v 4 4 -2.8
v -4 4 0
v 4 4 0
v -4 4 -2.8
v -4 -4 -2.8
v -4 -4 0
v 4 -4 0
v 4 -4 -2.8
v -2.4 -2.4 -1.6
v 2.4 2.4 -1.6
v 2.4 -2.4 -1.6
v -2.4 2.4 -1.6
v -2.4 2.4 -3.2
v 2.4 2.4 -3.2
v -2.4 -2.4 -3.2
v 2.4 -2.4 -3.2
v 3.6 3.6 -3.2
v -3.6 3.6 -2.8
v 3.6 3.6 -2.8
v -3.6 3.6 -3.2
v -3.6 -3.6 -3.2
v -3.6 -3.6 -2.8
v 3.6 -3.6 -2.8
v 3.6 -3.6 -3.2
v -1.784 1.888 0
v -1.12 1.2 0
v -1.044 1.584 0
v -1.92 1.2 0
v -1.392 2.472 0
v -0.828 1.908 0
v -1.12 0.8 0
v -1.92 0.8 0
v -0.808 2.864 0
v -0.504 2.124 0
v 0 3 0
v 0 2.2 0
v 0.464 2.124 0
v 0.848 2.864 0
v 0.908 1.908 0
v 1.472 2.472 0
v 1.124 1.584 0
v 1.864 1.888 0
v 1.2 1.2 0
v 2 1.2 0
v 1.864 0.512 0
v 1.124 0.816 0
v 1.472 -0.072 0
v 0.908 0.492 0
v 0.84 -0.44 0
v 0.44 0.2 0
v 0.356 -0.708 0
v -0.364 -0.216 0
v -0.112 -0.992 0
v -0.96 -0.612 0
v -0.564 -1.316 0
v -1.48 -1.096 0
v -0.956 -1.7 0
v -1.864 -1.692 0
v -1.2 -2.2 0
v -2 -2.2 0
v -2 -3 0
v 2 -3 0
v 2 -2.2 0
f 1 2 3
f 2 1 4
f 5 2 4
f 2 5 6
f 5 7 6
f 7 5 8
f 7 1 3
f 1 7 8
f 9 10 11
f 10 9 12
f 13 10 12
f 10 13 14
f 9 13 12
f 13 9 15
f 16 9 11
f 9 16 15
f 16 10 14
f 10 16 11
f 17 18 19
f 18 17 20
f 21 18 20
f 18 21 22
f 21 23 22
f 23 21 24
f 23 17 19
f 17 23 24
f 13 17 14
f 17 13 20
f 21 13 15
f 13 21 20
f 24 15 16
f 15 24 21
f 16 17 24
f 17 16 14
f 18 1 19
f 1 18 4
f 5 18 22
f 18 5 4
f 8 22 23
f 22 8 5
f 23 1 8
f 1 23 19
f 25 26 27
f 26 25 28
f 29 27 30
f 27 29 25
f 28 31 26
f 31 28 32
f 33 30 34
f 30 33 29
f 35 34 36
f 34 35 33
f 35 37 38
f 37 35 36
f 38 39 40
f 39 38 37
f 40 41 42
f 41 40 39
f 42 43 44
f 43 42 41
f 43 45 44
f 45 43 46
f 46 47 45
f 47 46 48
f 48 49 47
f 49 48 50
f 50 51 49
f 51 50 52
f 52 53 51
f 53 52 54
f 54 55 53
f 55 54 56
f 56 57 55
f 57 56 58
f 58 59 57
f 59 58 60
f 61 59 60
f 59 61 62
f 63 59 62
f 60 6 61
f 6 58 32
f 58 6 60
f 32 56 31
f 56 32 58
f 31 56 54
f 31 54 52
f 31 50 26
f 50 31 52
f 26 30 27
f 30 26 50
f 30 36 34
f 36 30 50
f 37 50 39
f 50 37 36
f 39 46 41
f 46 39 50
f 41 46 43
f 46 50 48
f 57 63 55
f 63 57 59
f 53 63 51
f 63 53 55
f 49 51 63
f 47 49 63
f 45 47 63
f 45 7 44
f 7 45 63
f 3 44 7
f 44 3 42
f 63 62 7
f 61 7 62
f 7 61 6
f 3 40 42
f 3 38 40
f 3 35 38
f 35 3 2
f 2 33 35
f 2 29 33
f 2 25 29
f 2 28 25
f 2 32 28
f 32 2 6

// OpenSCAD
// file: ../p/4-4edge.scad
use <../lib.scad>
$fa=1; $fs=0.2;
function ldraw_lib__4_4edge(realsolid=false) = [
// 0 Circle 1.0
// 0 Name: 4-4edge.dat
// 0 Author: James Jessiman
// 0 !LDRAW_ORG Primitive UPDATE 2017-01
// 0 !LICENSE Licensed under CC BY 2.0 and CC BY 4.0 : see CAreadme.txt
// 
// 0 BFC CERTIFY CCW
  [0,"BFC","CERTIFY"],
  [0,"BFC","CCW"],
// 
// 0 !HISTORY 1998-12-15 [PTadmin] Official Update 1998-10
// 0 !HISTORY 2005-12-28 [PTadmin] Official Update 2005-01
// 0 !HISTORY 2007-06-24 [PTadmin] Header formatted for Contributor Agreement
// 0 !HISTORY 2008-07-01 [PTadmin] Official Update 2008-01
// 0 !HISTORY 2017-01-15 [Steffen] BFCed
// 0 !HISTORY 2017-12-30 [PTadmin] Official Update 2017-01
// 
// 
// 2 24 1 0 0 0.9239 0 0.3827
  [2,24,1,0,0,0.9239,0,0.3827],
// 2 24 0.9239 0 0.3827 0.7071 0 0.7071
  [2,24,0.9239,0,0.3827,0.7071,0,0.7071],
// 2 24 0.7071 0 0.7071 0.3827 0 0.9239
  [2,24,0.7071,0,0.7071,0.3827,0,0.9239],
// 2 24 0.3827 0 0.9239 0 0 1
  [2,24,0.3827,0,0.9239,0,0,1],
// 2 24 0 0 1 -0.3827 0 0.9239
  [2,24,0,0,1,-0.3827,0,0.9239],
// 2 24 -0.3827 0 0.9239 -0.7071 0 0.7071
  [2,24,-0.3827,0,0.9239,-0.7071,0,0.7071],
// 2 24 -0.7071 0 0.7071 -0.9239 0 0.3827
  [2,24,-0.7071,0,0.7071,-0.9239,0,0.3827],
// 2 24 -0.9239 0 0.3827 -1 0 -0
  [2,24,-0.9239,0,0.3827,-1,0,-0],
// 2 24 -1 0 -0 -0.9239 0 -0.3827
  [2,24,-1,0,-0,-0.9239,0,-0.3827],
// 2 24 -0.9239 0 -0.3827 -0.7071 0 -0.7071
  [2,24,-0.9239,0,-0.3827,-0.7071,0,-0.7071],
// 2 24 -0.7071 0 -0.7071 -0.3827 0 -0.9239
  [2,24,-0.7071,0,-0.7071,-0.3827,0,-0.9239],
// 2 24 -0.3827 0 -0.9239 0 0 -1
  [2,24,-0.3827,0,-0.9239,0,0,-1],
// 2 24 0 0 -1 0.3827 0 -0.9239
  [2,24,0,0,-1,0.3827,0,-0.9239],
// 2 24 0.3827 0 -0.9239 0.7071 0 -0.7071
  [2,24,0.3827,0,-0.9239,0.7071,0,-0.7071],
// 2 24 0.7071 0 -0.7071 0.9239 0 -0.3827
  [2,24,0.7071,0,-0.7071,0.9239,0,-0.3827],
// 2 24 0.9239 0 -0.3827 1 0 0
  [2,24,0.9239,0,-0.3827,1,0,0],
];
module ldraw_lib__4_4edge(step=0, col=false, unit=2/5, alt=false, line=0.2, solid=!$preview)
    makepoly(ldraw_lib__4_4edge(solid), step=step, col=col, unit=unit, alt=alt, line=line, solid=solid);
ldraw_lib__4_4edge(line=0.2);
// file: ../p/4-4disc.scad
use <../lib.scad>
$fa=1; $fs=0.2;
function ldraw_lib__4_4disc(realsolid=false) = [
// 0 Disc 1.0
// 0 Name: 4-4disc.dat
// 0 Author: James Jessiman
// 0 !LDRAW_ORG Primitive UPDATE 2002-02
// 0 !LICENSE Licensed under CC BY 2.0 and CC BY 4.0 : see CAreadme.txt
// 
// 0 BFC CERTIFY CCW
  [0,"BFC","CERTIFY"],
  [0,"BFC","CCW"],
// 
// 0 !HISTORY 1998-12-15 [PTadmin] Official Update 1998-10
// 0 !HISTORY 2002-03-23 [sbliss] Added BFC statement
// 0 !HISTORY 2002-04-25 [PTadmin] Official Update 2002-02
// 0 !HISTORY 2007-06-24 [PTadmin] Header formatted for Contributor Agreement
// 0 !HISTORY 2008-07-01 [PTadmin] Official Update 2008-01
// 
// 
// 3 16 0 0 0 1 0 0 0.9239 0 0.3827
  [3,16,0,0,0,1,0,0,0.9239,0,0.3827],
// 3 16 0 0 0 0.9239 0 0.3827 0.7071 0 0.7071
  [3,16,0,0,0,0.9239,0,0.3827,0.7071,0,0.7071],
// 3 16 0 0 0 0.7071 0 0.7071 0.3827 0 0.9239
  [3,16,0,0,0,0.7071,0,0.7071,0.3827,0,0.9239],
// 3 16 0 0 0 0.3827 0 0.9239 0 0 1
  [3,16,0,0,0,0.3827,0,0.9239,0,0,1],
// 3 16 0 0 0 0 0 1 -0.3827 0 0.9239
  [3,16,0,0,0,0,0,1,-0.3827,0,0.9239],
// 3 16 0 0 0 -0.3827 0 0.9239 -0.7071 0 0.7071
  [3,16,0,0,0,-0.3827,0,0.9239,-0.7071,0,0.7071],
// 3 16 0 0 0 -0.7071 0 0.7071 -0.9239 0 0.3827
  [3,16,0,0,0,-0.7071,0,0.7071,-0.9239,0,0.3827],
// 3 16 0 0 0 -0.9239 0 0.3827 -1 0 -0
  [3,16,0,0,0,-0.9239,0,0.3827,-1,0,-0],
// 3 16 0 0 0 -1 0 -0 -0.9239 0 -0.3827
  [3,16,0,0,0,-1,0,-0,-0.9239,0,-0.3827],
// 3 16 0 0 0 -0.9239 0 -0.3827 -0.7071 0 -0.7071
  [3,16,0,0,0,-0.9239,0,-0.3827,-0.7071,0,-0.7071],
// 3 16 0 0 0 -0.7071 0 -0.7071 -0.3827 0 -0.9239
  [3,16,0,0,0,-0.7071,0,-0.7071,-0.3827,0,-0.9239],
// 3 16 0 0 0 -0.3827 0 -0.9239 0 0 -1
  [3,16,0,0,0,-0.3827,0,-0.9239,0,0,-1],
// 3 16 0 0 0 0 0 -1 0.3827 0 -0.9239
  [3,16,0,0,0,0,0,-1,0.3827,0,-0.9239],
// 3 16 0 0 0 0.3827 0 -0.9239 0.7071 0 -0.7071
  [3,16,0,0,0,0.3827,0,-0.9239,0.7071,0,-0.7071],
// 3 16 0 0 0 0.7071 0 -0.7071 0.9239 0 -0.3827
  [3,16,0,0,0,0.7071,0,-0.7071,0.9239,0,-0.3827],
// 3 16 0 0 0 0.9239 0 -0.3827 1 0 0
  [3,16,0,0,0,0.9239,0,-0.3827,1,0,0],
// 0
];
module ldraw_lib__4_4disc(step=0, col=false, unit=2/5, alt=false, line=0.2, solid=!$preview)
    makepoly(ldraw_lib__4_4disc(solid), step=step, col=col, unit=unit, alt=alt, line=line, solid=solid);
ldraw_lib__4_4disc(line=0.2);
// file: ../p/4-4cyli.scad
use <../lib.scad>
$fa=1; $fs=0.2;
function ldraw_lib__4_4cyli(realsolid=false) = [
// 0 Cylinder 1.0
// 0 Name: 4-4cyli.dat
// 0 Author: James Jessiman
// 0 !LDRAW_ORG Primitive UPDATE 2005-01
// 0 !LICENSE Licensed under CC BY 2.0 and CC BY 4.0 : see CAreadme.txt
// 
// 0 BFC CERTIFY CCW
  [0,"BFC","CERTIFY"],
  [0,"BFC","CCW"],
// 
// 0 !HISTORY 1998-12-15 [PTadmin] Official Update 1998-10
// 0 !HISTORY 2002-03-23 [sbliss] Added BFC statement; merged headers from files in distributions LDraw 0.27 and Complete.
// 0 !HISTORY 2002-04-25 [PTadmin] Official Update 2002-02
// 0 !HISTORY 2004-12-14 [guyvivan] BFC CCW
// 0 !HISTORY 2005-12-28 [PTadmin] Official Update 2005-01
// 0 !HISTORY 2007-06-24 [PTadmin] Header formatted for Contributor Agreement
// 0 !HISTORY 2008-07-01 [PTadmin] Official Update 2008-01
// 
// 
// 4 16 1 1 0 0.9239 1 0.3827 0.9239 0 0.3827 1 0 0
  [4,16,1,1,0,0.9239,1,0.3827,0.9239,0,0.3827,1,0,0],
// 5 24 1 0 0 1 1 0 0.9239 0 0.3827 0.9239 0 -0.3827
  [5,24,1,0,0,1,1,0,0.9239,0,0.3827,0.9239,0,-0.3827],
// 4 16 0.9239 1 0.3827 0.7071 1 0.7071 0.7071 0 0.7071 0.9239 0 0.3827
  [4,16,0.9239,1,0.3827,0.7071,1,0.7071,0.7071,0,0.7071,0.9239,0,0.3827],
// 5 24 0.9239 0 0.3827 0.9239 1 0.3827 0.7071 0 0.7071 1 0 0
  [5,24,0.9239,0,0.3827,0.9239,1,0.3827,0.7071,0,0.7071,1,0,0],
// 4 16 0.7071 1 0.7071 0.3827 1 0.9239 0.3827 0 0.9239 0.7071 0 0.7071
  [4,16,0.7071,1,0.7071,0.3827,1,0.9239,0.3827,0,0.9239,0.7071,0,0.7071],
// 5 24 0.7071 0 0.7071 0.7071 1 0.7071 0.3827 0 0.9239 0.9239 0 0.3827
  [5,24,0.7071,0,0.7071,0.7071,1,0.7071,0.3827,0,0.9239,0.9239,0,0.3827],
// 4 16 0.3827 1 0.9239 0 1 1 0 0 1 0.3827 0 0.9239
  [4,16,0.3827,1,0.9239,0,1,1,0,0,1,0.3827,0,0.9239],
// 5 24 0.3827 0 0.9239 0.3827 1 0.9239 0 0 1 0.7071 0 0.7071
  [5,24,0.3827,0,0.9239,0.3827,1,0.9239,0,0,1,0.7071,0,0.7071],
// 4 16 0 1 1 -0.3827 1 0.9239 -0.3827 0 0.9239 0 0 1
  [4,16,0,1,1,-0.3827,1,0.9239,-0.3827,0,0.9239,0,0,1],
// 5 24 0 0 1 0 1 1 -0.3827 0 0.9239 0.3827 0 0.9239
  [5,24,0,0,1,0,1,1,-0.3827,0,0.9239,0.3827,0,0.9239],
// 4 16 -0.3827 1 0.9239 -0.7071 1 0.7071 -0.7071 0 0.7071 -0.3827 0 0.9239
  [4,16,-0.3827,1,0.9239,-0.7071,1,0.7071,-0.7071,0,0.7071,-0.3827,0,0.9239],
// 5 24 -0.3827 0 0.9239 -0.3827 1 0.9239 -0.7071 0 0.7071 0 0 1
  [5,24,-0.3827,0,0.9239,-0.3827,1,0.9239,-0.7071,0,0.7071,0,0,1],
// 4 16 -0.7071 1 0.7071 -0.9239 1 0.3827 -0.9239 0 0.3827 -0.7071 0 0.7071
  [4,16,-0.7071,1,0.7071,-0.9239,1,0.3827,-0.9239,0,0.3827,-0.7071,0,0.7071],
// 5 24 -0.7071 0 0.7071 -0.7071 1 0.7071 -0.9239 0 0.3827 -0.3827 0 0.9239
  [5,24,-0.7071,0,0.7071,-0.7071,1,0.7071,-0.9239,0,0.3827,-0.3827,0,0.9239],
// 4 16 -0.9239 1 0.3827 -1 1 0 -1 0 0 -0.9239 0 0.3827
  [4,16,-0.9239,1,0.3827,-1,1,0,-1,0,0,-0.9239,0,0.3827],
// 5 24 -0.9239 0 0.3827 -0.9239 1 0.3827 -1 0 0 -0.7071 0 0.7071
  [5,24,-0.9239,0,0.3827,-0.9239,1,0.3827,-1,0,0,-0.7071,0,0.7071],
// 4 16 -1 1 0 -0.9239 1 -0.3827 -0.9239 0 -0.3827 -1 0 0
  [4,16,-1,1,0,-0.9239,1,-0.3827,-0.9239,0,-0.3827,-1,0,0],
// 5 24 -1 0 0 -1 1 0 -0.9239 0 -0.3827 -0.9239 0 0.3827
  [5,24,-1,0,0,-1,1,0,-0.9239,0,-0.3827,-0.9239,0,0.3827],
// 4 16 -0.9239 1 -0.3827 -0.7071 1 -0.7071 -0.7071 0 -0.7071 -0.9239 0 -0.3827
  [4,16,-0.9239,1,-0.3827,-0.7071,1,-0.7071,-0.7071,0,-0.7071,-0.9239,0,-0.3827],
// 5 24 -0.9239 0 -0.3827 -0.9239 1 -0.3827 -0.7071 0 -0.7071 -1 0 0
  [5,24,-0.9239,0,-0.3827,-0.9239,1,-0.3827,-0.7071,0,-0.7071,-1,0,0],
// 4 16 -0.7071 1 -0.7071 -0.3827 1 -0.9239 -0.3827 0 -0.9239 -0.7071 0 -0.7071
  [4,16,-0.7071,1,-0.7071,-0.3827,1,-0.9239,-0.3827,0,-0.9239,-0.7071,0,-0.7071],
// 5 24 -0.7071 0 -0.7071 -0.7071 1 -0.7071 -0.3827 0 -0.9239 -0.9239 0 -0.3827
  [5,24,-0.7071,0,-0.7071,-0.7071,1,-0.7071,-0.3827,0,-0.9239,-0.9239,0,-0.3827],
// 4 16 -0.3827 1 -0.9239 0 1 -1 0 0 -1 -0.3827 0 -0.9239
  [4,16,-0.3827,1,-0.9239,0,1,-1,0,0,-1,-0.3827,0,-0.9239],
// 5 24 -0.3827 0 -0.9239 -0.3827 1 -0.9239 0 0 -1 -0.7071 0 -0.7071
  [5,24,-0.3827,0,-0.9239,-0.3827,1,-0.9239,0,0,-1,-0.7071,0,-0.7071],
// 4 16 0 1 -1 0.3827 1 -0.9239 0.3827 0 -0.9239 0 0 -1
  [4,16,0,1,-1,0.3827,1,-0.9239,0.3827,0,-0.9239,0,0,-1],
// 5 24 0 0 -1 0 1 -1 0.3827 0 -0.9239 -0.3827 0 -0.9239
  [5,24,0,0,-1,0,1,-1,0.3827,0,-0.9239,-0.3827,0,-0.9239],
// 4 16 0.3827 1 -0.9239 0.7071 1 -0.7071 0.7071 0 -0.7071 0.3827 0 -0.9239
  [4,16,0.3827,1,-0.9239,0.7071,1,-0.7071,0.7071,0,-0.7071,0.3827,0,-0.9239],
// 5 24 0.3827 0 -0.9239 0.3827 1 -0.9239 0.7071 0 -0.7071 0 0 -1
  [5,24,0.3827,0,-0.9239,0.3827,1,-0.9239,0.7071,0,-0.7071,0,0,-1],
// 4 16 0.7071 1 -0.7071 0.9239 1 -0.3827 0.9239 0 -0.3827 0.7071 0 -0.7071
  [4,16,0.7071,1,-0.7071,0.9239,1,-0.3827,0.9239,0,-0.3827,0.7071,0,-0.7071],
// 5 24 0.7071 0 -0.7071 0.7071 1 -0.7071 0.9239 0 -0.3827 0.3827 0 -0.9239
  [5,24,0.7071,0,-0.7071,0.7071,1,-0.7071,0.9239,0,-0.3827,0.3827,0,-0.9239],
// 4 16 0.9239 1 -0.3827 1 1 0 1 0 0 0.9239 0 -0.3827
  [4,16,0.9239,1,-0.3827,1,1,0,1,0,0,0.9239,0,-0.3827],
// 5 24 0.9239 0 -0.3827 0.9239 1 -0.3827 1 0 0 0.7071 0 -0.7071
  [5,24,0.9239,0,-0.3827,0.9239,1,-0.3827,1,0,0,0.7071,0,-0.7071],
// 0
];
module ldraw_lib__4_4cyli(step=0, col=false, unit=2/5, alt=false, line=0.2, solid=!$preview)
    makepoly(ldraw_lib__4_4cyli(solid), step=step, col=col, unit=unit, alt=alt, line=line, solid=solid);
ldraw_lib__4_4cyli(line=0.2);
// file: ../p/stud3.scad
use <../lib.scad>
use <4-4cyli.scad>
use <4-4disc.scad>
use <4-4edge.scad>
$fa=1; $fs=0.2;
function ldraw_lib__stud3(realsolid=false) = realsolid ? 
    [openscad(translate([0,0,-eps()], o=cylinder(4+eps(), r=4)),2)] : [
// 0 Stud Tube Solid
// 0 Name: stud3.dat
// 0 Author: James Jessiman
// 0 !LDRAW_ORG Primitive UPDATE 2012-01
// 0 !LICENSE Licensed under CC BY 2.0 and CC BY 4.0 : see CAreadme.txt
// 
// 0 BFC CERTIFY CCW
  [0,"BFC","CERTIFY"],
  [0,"BFC","CCW"],
// 
// 0 !HISTORY 2002-04-04 [sbliss] Modified for BFC compliance
// 0 !HISTORY 2002-04-25 [PTadmin] Official Update 2002-02
// 0 !HISTORY 2007-06-24 [PTadmin] Header formatted for Contributor Agreement
// 0 !HISTORY 2008-07-01 [PTadmin] Official Update 2008-01
// 0 !HISTORY 2012-02-16 [Philo] Changed to CCW
// 0 !HISTORY 2012-03-30 [PTadmin] Official Update 2012-01
// 
// 
// 1 16 0 -4 0 4 0 0 0 1 0 0 0 4 4-4edge.dat
  [1,16,0,-4,0,4,0,0,0,1,0,0,0,4, ldraw_lib__4_4edge(realsolid)],
// 1 16 0 0 0 4 0 0 0 1 0 0 0 4 4-4edge.dat
  [1,16,0,0,0,4,0,0,0,1,0,0,0,4, ldraw_lib__4_4edge(realsolid)],
// 1 16 0 -4 0 4 0 0 0 1 0 0 0 4 4-4disc.dat
  [1,16,0,-4,0,4,0,0,0,1,0,0,0,4, ldraw_lib__4_4disc(realsolid)],
// 1 16 0 -4 0 4 0 0 0 4 0 0 0 4 4-4cyli.dat
  [1,16,0,-4,0,4,0,0,0,4,0,0,0,4, ldraw_lib__4_4cyli(realsolid)],
];
module ldraw_lib__stud3(step=0, col=false, unit=2/5, alt=false, line=0.2, solid=!$preview)
    makepoly(ldraw_lib__stud3(solid), step=step, col=col, unit=unit, alt=alt, line=line, solid=solid);
ldraw_lib__stud3(line=0.2);
// file: ../p/stud.scad
use <../lib.scad>
use <4-4cyli.scad>
use <4-4disc.scad>
use <4-4edge.scad>
$fa=1; $fs=0.2;
function ldraw_lib__stud(realsolid=false) = realsolid ? 
    [openscad(translate([0,0,-eps()], o=cylinder(4+eps(), r=6)),2)] : [
// 0 Stud
// 0 Name: stud.dat
// 0 Author: James Jessiman
// 0 !LDRAW_ORG Primitive UPDATE 2012-01
// 0 !LICENSE Licensed under CC BY 2.0 and CC BY 4.0 : see CAreadme.txt
// 
// 0 BFC CERTIFY CCW
  [0,"BFC","CERTIFY"],
  [0,"BFC","CCW"],
// 
// 0 !HISTORY 2002-04-04 [sbliss] Modified for BFC compliance
// 0 !HISTORY 2002-04-25 [PTadmin] Official Update 2002-02
// 0 !HISTORY 2007-06-24 [PTadmin] Header formatted for Contributor Agreement
// 0 !HISTORY 2008-07-01 [PTadmin] Official Update 2008-01
// 0 !HISTORY 2012-02-16 [Philo] Changed to CCW
// 0 !HISTORY 2012-03-30 [PTadmin] Official Update 2012-01
// 
// 
// 1 16 0 0 0 6 0 0 0 1 0 0 0 6 4-4edge.dat
  [1,16,0,0,0,6,0,0,0,1,0,0,0,6, ldraw_lib__4_4edge(realsolid)],
// 1 16 0 -4 0 6 0 0 0 1 0 0 0 6 4-4edge.dat
  [1,16,0,-4,0,6,0,0,0,1,0,0,0,6, ldraw_lib__4_4edge(realsolid)],
// 1 16 0 0 0 6 0 0 0 -4 0 0 0 6 4-4cyli.dat
  [1,16,0,0,0,6,0,0,0,-4,0,0,0,6, ldraw_lib__4_4cyli(realsolid)],
// 1 16 0 -4 0 6 0 0 0 1 0 0 0 6 4-4disc.dat
  [1,16,0,-4,0,6,0,0,0,1,0,0,0,6, ldraw_lib__4_4disc(realsolid)],
];
module ldraw_lib__stud(step=0, col=false, unit=2/5, alt=false, line=0.2, solid=!$preview)
    makepoly(ldraw_lib__stud(solid), step=step, col=col, unit=unit, alt=alt, line=line, solid=solid);
ldraw_lib__stud(line=0.2);
// file: ../p/box4t.scad
use <../lib.scad>
$fa=1; $fs=0.2;
function ldraw_lib__box4t(realsolid=false) = [
// 0 Box with 4 Adjacent Faces and All Edges
// 0 Name: box4t.dat
// 0 Author: Tore Eriksson [Tore_Eriksson]
// 0 !LDRAW_ORG Primitive UPDATE 2003-02
// 0 !LICENSE Licensed under CC BY 2.0 and CC BY 4.0 : see CAreadme.txt
// 
// 0 BFC CERTIFY CCW
  [0,"BFC","CERTIFY"],
  [0,"BFC","CCW"],
// 
// 0 !HISTORY 1997-09-29 [PTadmin] Official Update 1997-15
// 0 !HISTORY 2002-08-31 [izanette] Modified with WINDZ for BFC compliance
// 0 !HISTORY 2003-08-01 [PTadmin] Official Update 2003-02
// 0 !HISTORY 2007-06-24 [PTadmin] Header formatted for Contributor Agreement
// 0 !HISTORY 2008-07-01 [PTadmin] Official Update 2008-01
// 
// 
// 2 24 1 1 1 -1 1 1
  [2,24,1,1,1,-1,1,1],
// 2 24 -1 1 1 -1 1 -1
  [2,24,-1,1,1,-1,1,-1],
// 2 24 -1 1 -1 1 1 -1
  [2,24,-1,1,-1,1,1,-1],
// 2 24 1 1 -1 1 1 1
  [2,24,1,1,-1,1,1,1],
// 2 24 1 0 1 -1 0 1
  [2,24,1,0,1,-1,0,1],
// 2 24 -1 0 1 -1 0 -1
  [2,24,-1,0,1,-1,0,-1],
// 2 24 -1 0 -1 1 0 -1
  [2,24,-1,0,-1,1,0,-1],
// 2 24 1 0 -1 1 0 1
  [2,24,1,0,-1,1,0,1],
// 2 24 1 0 1 1 1 1
  [2,24,1,0,1,1,1,1],
// 2 24 -1 0 1 -1 1 1
  [2,24,-1,0,1,-1,1,1],
// 2 24 1 0 -1 1 1 -1
  [2,24,1,0,-1,1,1,-1],
// 2 24 -1 0 -1 -1 1 -1
  [2,24,-1,0,-1,-1,1,-1],
// 4 16 1 1 1 1 1 -1 -1 1 -1 -1 1 1
  [4,16,1,1,1,1,1,-1,-1,1,-1,-1,1,1],
// 4 16 1 1 1 -1 1 1 -1 0 1 1 0 1
  [4,16,1,1,1,-1,1,1,-1,0,1,1,0,1],
// 4 16 -1 1 1 -1 1 -1 -1 0 -1 -1 0 1
  [4,16,-1,1,1,-1,1,-1,-1,0,-1,-1,0,1],
// 0 4 16 -1 1 -1 -1 0 -1 1 0 -1 1 1 -1
// 4 16 1 1 -1 1 1 1 1 0 1 1 0 -1
  [4,16,1,1,-1,1,1,1,1,0,1,1,0,-1],
// 0
];
module ldraw_lib__box4t(step=0, col=false, unit=2/5, alt=false, line=0.2, solid=!$preview)
    makepoly(ldraw_lib__box4t(solid), step=step, col=col, unit=unit, alt=alt, line=line, solid=solid);
ldraw_lib__box4t(line=0.2);
// file: s/3004s01.scad
use <../../lib.scad>
use <../../p/box4t.scad>
use <../../p/box5.scad>
use <../../p/stud.scad>
use <../../p/stud3.scad>
$fa=1; $fs=0.2;
function ldraw_lib__s__3004s01(realsolid=false) = [
// 0 ~Brick  1 x  2 without Front Face
// 0 Name: s\3004s01.dat
// 0 Author: James Jessiman
// 0 !LDRAW_ORG Subpart UPDATE 2003-03
// 0 !LICENSE Licensed under CC BY 2.0 and CC BY 4.0 : see CAreadme.txt
// 
// 0 BFC CERTIFY CCW
  [0,"BFC","CERTIFY"],
  [0,"BFC","CCW"],
// 
// 0 !HISTORY 2003-09-07 [jriley] Subfiling, BFC
// 0 !HISTORY 2003-12-19 [PTadmin] Official Update 2003-03
// 0 !HISTORY 2007-08-29 [PTadmin] Header formatted for Contributor Agreement
// 0 !HISTORY 2008-07-01 [PTadmin] Official Update 2008-01
// 
// 
// 1 16 0 4 0 1 0 0 0 -5 0 0 0 1 stud3.dat
  [1,16,0,4,0,1,0,0,0,-5,0,0,0,1, ldraw_lib__stud3(realsolid)],
// 0 BFC INVERTNEXT
  [0,"BFC","INVERTNEXT"],
// 1 16 0 24 0 16 0 0 0 -20 0 0 0 6 box5.dat
  [1,16,0,24,0,16,0,0,0,-20,0,0,0,6, ldraw_lib__box5(realsolid)],
// 4 16 20 24 10 16 24 6 -16 24 6 -20 24 10
  [4,16,20,24,10,16,24,6,-16,24,6,-20,24,10],
// 4 16 -20 24 10 -16 24 6 -16 24 -6 -20 24 -10
  [4,16,-20,24,10,-16,24,6,-16,24,-6,-20,24,-10],
// 4 16 -20 24 -10 -16 24 -6 16 24 -6 20 24 -10
  [4,16,-20,24,-10,-16,24,-6,16,24,-6,20,24,-10],
// 4 16 20 24 -10 16 24 -6 16 24 6 20 24 10
  [4,16,20,24,-10,16,24,-6,16,24,6,20,24,10],
// 1 16 0 24 0 20 0 0 0 -24 0 0 0 10 box4t.dat
  [1,16,0,24,0,20,0,0,0,-24,0,0,0,10, ldraw_lib__box4t(realsolid)],
// 1 16 10 0 0 1 0 0 0 1 0 0 0 1 stud.dat
  [1,16,10,0,0,1,0,0,0,1,0,0,0,1, ldraw_lib__stud(realsolid)],
// 1 16 -10 0 0 1 0 0 0 1 0 0 0 1 stud.dat
  [1,16,-10,0,0,1,0,0,0,1,0,0,0,1, ldraw_lib__stud(realsolid)],
// 0
];
module ldraw_lib__s__3004s01(step=0, col=false, unit=2/5, alt=false, line=0.2, solid=!$preview)
    makepoly(ldraw_lib__s__3004s01(solid), step=step, col=col, unit=unit, alt=alt, line=line, solid=solid);
ldraw_lib__s__3004s01(line=0.2);
// file: ../p/box5.scad
use <../lib.scad>
$fa=1; $fs=0.2;
function ldraw_lib__box5(realsolid=false) = [
// 0 Box with 5 Faces and All Edges
// 0 Name: box5.dat
// 0 Author: James Jessiman
// 0 !LDRAW_ORG Primitive UPDATE 2012-01
// 0 !LICENSE Licensed under CC BY 2.0 and CC BY 4.0 : see CAreadme.txt
// 
// 0 BFC CERTIFY CCW
  [0,"BFC","CERTIFY"],
  [0,"BFC","CCW"],
// 
// 0 !HISTORY 2002-04-03 [sbliss] Modified for BFC compliance
// 0 !HISTORY 2002-04-25 [PTadmin] Official Update 2002-02
// 0 !HISTORY 2007-06-24 [PTadmin] Header formatted for Contributor Agreement
// 0 !HISTORY 2008-07-01 [PTadmin] Official Update 2008-01
// 0 !HISTORY 2012-02-16 [Philo] Changed to CCW
// 0 !HISTORY 2012-03-30 [PTadmin] Official Update 2012-01
// 
// 
// 2 24 1 1 1 -1 1 1
  [2,24,1,1,1,-1,1,1],
// 2 24 -1 1 1 -1 1 -1
  [2,24,-1,1,1,-1,1,-1],
// 2 24 -1 1 -1 1 1 -1
  [2,24,-1,1,-1,1,1,-1],
// 2 24 1 1 -1 1 1 1
  [2,24,1,1,-1,1,1,1],
// 2 24 1 0 1 -1 0 1
  [2,24,1,0,1,-1,0,1],
// 2 24 -1 0 1 -1 0 -1
  [2,24,-1,0,1,-1,0,-1],
// 2 24 -1 0 -1 1 0 -1
  [2,24,-1,0,-1,1,0,-1],
// 2 24 1 0 -1 1 0 1
  [2,24,1,0,-1,1,0,1],
// 2 24 1 0 1 1 1 1
  [2,24,1,0,1,1,1,1],
// 2 24 -1 0 1 -1 1 1
  [2,24,-1,0,1,-1,1,1],
// 2 24 1 0 -1 1 1 -1
  [2,24,1,0,-1,1,1,-1],
// 2 24 -1 0 -1 -1 1 -1
  [2,24,-1,0,-1,-1,1,-1],
// 4 16 -1 1 1 1 1 1 1 1 -1 -1 1 -1
  [4,16,-1,1,1,1,1,1,1,1,-1,-1,1,-1],
// 4 16 -1 1 1 -1 0 1 1 0 1 1 1 1
  [4,16,-1,1,1,-1,0,1,1,0,1,1,1,1],
// 4 16 -1 1 -1 -1 0 -1 -1 0 1 -1 1 1
  [4,16,-1,1,-1,-1,0,-1,-1,0,1,-1,1,1],
// 4 16 1 1 -1 1 0 -1 -1 0 -1 -1 1 -1
  [4,16,1,1,-1,1,0,-1,-1,0,-1,-1,1,-1],
// 4 16 1 1 1 1 0 1 1 0 -1 1 1 -1
  [4,16,1,1,1,1,0,1,1,0,-1,1,1,-1],
];
module ldraw_lib__box5(step=0, col=false, unit=2/5, alt=false, line=0.2, solid=!$preview)
    makepoly(ldraw_lib__box5(solid), step=step, col=col, unit=unit, alt=alt, line=line, solid=solid);
ldraw_lib__box5(line=0.2);
// file: ../p/box4.scad
use <../lib.scad>
$fa=1; $fs=0.2;
function ldraw_lib__box4(realsolid=false) = [
// 0 Box with 4 Faces (2 Parallel Pairs) and All Edges
// 0 Name: box4.dat
// 0 Author: James Jessiman
// 0 !LDRAW_ORG Primitive UPDATE 2012-01
// 0 !LICENSE Licensed under CC BY 2.0 and CC BY 4.0 : see CAreadme.txt
// 
// 0 BFC CERTIFY CCW
  [0,"BFC","CERTIFY"],
  [0,"BFC","CCW"],
// 
// 0 !HISTORY 2002-04-03 [sbliss] Modified for BFC compliance
// 0 !HISTORY 2002-04-25 [PTadmin] Official Update 2002-02
// 0 !HISTORY 2007-06-24 [PTadmin] Header formatted for Contributor Agreement
// 0 !HISTORY 2008-07-01 [PTadmin] Official Update 2008-01
// 0 !HISTORY 2012-02-16 [Philo] Changed to CCW
// 0 !HISTORY 2012-03-30 [PTadmin] Official Update 2012-01
// 
// 
// 2 24 1 1 1 -1 1 1
  [2,24,1,1,1,-1,1,1],
// 2 24 -1 1 1 -1 1 -1
  [2,24,-1,1,1,-1,1,-1],
// 2 24 -1 1 -1 1 1 -1
  [2,24,-1,1,-1,1,1,-1],
// 2 24 1 1 -1 1 1 1
  [2,24,1,1,-1,1,1,1],
// 2 24 1 0 1 -1 0 1
  [2,24,1,0,1,-1,0,1],
// 2 24 -1 0 1 -1 0 -1
  [2,24,-1,0,1,-1,0,-1],
// 2 24 -1 0 -1 1 0 -1
  [2,24,-1,0,-1,1,0,-1],
// 2 24 1 0 -1 1 0 1
  [2,24,1,0,-1,1,0,1],
// 2 24 1 0 1 1 1 1
  [2,24,1,0,1,1,1,1],
// 2 24 -1 0 1 -1 1 1
  [2,24,-1,0,1,-1,1,1],
// 2 24 1 0 -1 1 1 -1
  [2,24,1,0,-1,1,1,-1],
// 2 24 -1 0 -1 -1 1 -1
  [2,24,-1,0,-1,-1,1,-1],
// 4 16 -1 1 1 -1 0 1 1 0 1 1 1 1
  [4,16,-1,1,1,-1,0,1,1,0,1,1,1,1],
// 4 16 -1 1 -1 -1 0 -1 -1 0 1 -1 1 1
  [4,16,-1,1,-1,-1,0,-1,-1,0,1,-1,1,1],
// 4 16 1 1 -1 1 0 -1 -1 0 -1 -1 1 -1
  [4,16,1,1,-1,1,0,-1,-1,0,-1,-1,1,-1],
// 4 16 1 1 1 1 0 1 1 0 -1 1 1 -1
  [4,16,1,1,1,1,0,1,1,0,-1,1,1,-1],
];
module ldraw_lib__box4(step=0, col=false, unit=2/5, alt=false, line=0.2, solid=!$preview)
    makepoly(ldraw_lib__box4(solid), step=step, col=col, unit=unit, alt=alt, line=line, solid=solid);
ldraw_lib__box4(line=0.2);
// file: 3004.scad
use <../lib.scad>
use <s/3004s01.scad>
$fa=1; $fs=0.2;
function ldraw_lib__3004(realsolid=false) = [
// 0 Brick  1 x  2
// 0 Name: 3004.dat
// 0 Author: James Jessiman
// 0 !LDRAW_ORG Part UPDATE 2022-05
// 0 !LICENSE Licensed under CC BY 2.0 and CC BY 4.0 : see CAreadme.txt
// 
// 0 BFC CERTIFY CCW
  [0,"BFC","CERTIFY"],
  [0,"BFC","CCW"],
// 
// 0 !HISTORY 2001-10-26 [PTadmin] Official Update 2001-01
// 0 !HISTORY 2002-05-07 {unknown} BFC Certification
// 0 !HISTORY 2002-06-11 [PTadmin] Official Update 2002-03
// 0 !HISTORY 2007-05-07 [PTadmin] Header formatted for Contributor Agreement
// 0 !HISTORY 2008-07-01 [PTadmin] Official Update 2008-01
// 0 !HISTORY 2022-08-04 [MagFors] Using subfile
// 0 !HISTORY 2022-09-15 [PTadmin] Official Update 2022-05
// 
// 
// 1 16 0 0 0 1 0 0 0 1 0 0 0 1 s\3004s01.dat
  [1,16,0,0,0,1,0,0,0,1,0,0,0,1, ldraw_lib__s__3004s01(realsolid)],
// 4 16 -20 24 -10 20 24 -10 20 0 -10 -20 0 -10
  [4,16,-20,24,-10,20,24,-10,20,0,-10,-20,0,-10],
];
module ldraw_lib__3004(step=0, col=false, unit=2/5, alt=false, line=0.2, solid=!$preview)
    makepoly(ldraw_lib__3004(solid), step=step, col=col, unit=unit, alt=alt, line=line, solid=solid);
ldraw_lib__3004(line=0.2);
// file: s/3070bs01.scad
use <../../lib.scad>
use <../../p/box4.scad>
use <../../p/box5.scad>
$fa=1; $fs=0.2;
function ldraw_lib__s__3070bs01(realsolid=false) = [
// 0 ~Tile  1 x  1 with Groove without Top Face
// 0 Name: s\3070bs01.dat
// 0 Author: Chris Dee [cwdee]
// 0 !LDRAW_ORG Subpart UPDATE 2009-02
// 0 !LICENSE Licensed under CC BY 2.0 and CC BY 4.0 : see CAreadme.txt
// 
// 0 BFC CERTIFY CCW
  [0,"BFC","CERTIFY"],
  [0,"BFC","CCW"],
// 
// 0 !HISTORY 2009-09-03 [PTadmin] Official Update 2009-02
// 
// 
// 1 16 0 0 0 10 0 0 0 7 0 0 0 10 box4.dat
  [1,16,0,0,0,10,0,0,0,7,0,0,0,10, ldraw_lib__box4(realsolid)],
// 0 BFC INVERTNEXT
  [0,"BFC","INVERTNEXT"],
// 1 16 0 8 0 6 0 0 0 -4 0 0 0 6 box5.dat
  [1,16,0,8,0,6,0,0,0,-4,0,0,0,6, ldraw_lib__box5(realsolid)],
// 1 16 0 7 0 9 0 0 0 1 0 0 0 9 box4.dat
  [1,16,0,7,0,9,0,0,0,1,0,0,0,9, ldraw_lib__box4(realsolid)],
// 
// 4 16 9 8 9 6 8 6 -6 8 6 -9 8 9
  [4,16,9,8,9,6,8,6,-6,8,6,-9,8,9],
// 4 16 -9 8 9 -6 8 6 -6 8 -6 -9 8 -9
  [4,16,-9,8,9,-6,8,6,-6,8,-6,-9,8,-9],
// 4 16 -9 8 -9 -6 8 -6 6 8 -6 9 8 -9
  [4,16,-9,8,-9,-6,8,-6,6,8,-6,9,8,-9],
// 4 16 9 8 -9 6 8 -6 6 8 6 9 8 9
  [4,16,9,8,-9,6,8,-6,6,8,6,9,8,9],
// 
// 4 16 10 7 10 9 7 9 -9 7 9 -10 7 10
  [4,16,10,7,10,9,7,9,-9,7,9,-10,7,10],
// 4 16 -10 7 10 -9 7 9 -9 7 -9 -10 7 -10
  [4,16,-10,7,10,-9,7,9,-9,7,-9,-10,7,-10],
// 4 16 -10 7 -10 -9 7 -9 9 7 -9 10 7 -10
  [4,16,-10,7,-10,-9,7,-9,9,7,-9,10,7,-10],
// 4 16 10 7 -10 9 7 -9 9 7 9 10 7 10
  [4,16,10,7,-10,9,7,-9,9,7,9,10,7,10],
// 0
];
module ldraw_lib__s__3070bs01(step=0, col=false, unit=2/5, alt=false, line=0.2, solid=!$preview)
    makepoly(ldraw_lib__s__3070bs01(solid), step=step, col=col, unit=unit, alt=alt, line=line, solid=solid);
ldraw_lib__s__3070bs01(line=0.2);
// main file
use <../lib.scad>
use <s/3070bs01.scad>
$fa=1; $fs=0.2;
function ldraw_lib__3070bpv2(realsolid=false) = [
// 0 Tile  1 x  1 with Silver "2" Pattern
// 0 Name: 3070bpv2.dat
// 0 Author: Magnus Forsberg [MagFors]
// 0 !LDRAW_ORG Part UPDATE 2015-02
// 0 !LICENSE Licensed under CC BY 2.0 and CC BY 4.0 : see CAreadme.txt
// 
// 0 BFC CERTIFY CCW
  [0,"BFC","CERTIFY"],
  [0,"BFC","CCW"],
// 
// 0 !HISTORY 2015-12-30 [PTadmin] Official Update 2015-02
// 
// 
// 1 16 0 0 0 1 0 0 0 1 0 0 0 1 s\3070bs01.dat
  [1,16,0,0,0,1,0,0,0,1,0,0,0,1, ldraw_lib__s__3070bs01(realsolid)],
// 
// 4 80 -2.8 0 3 -2.61 0 3.96 -4.46 0 4.72 -4.8 0 3
  [4,80,-2.8,0,3,-2.61,0,3.96,-4.46,0,4.72,-4.8,0,3],
// 4 80 -3.48 0 6.18 -4.46 0 4.72 -2.61 0 3.96 -2.07 0 4.77
  [4,80,-3.48,0,6.18,-4.46,0,4.72,-2.61,0,3.96,-2.07,0,4.77],
// 4 80 -2.8 0 2 -2.8 0 3 -4.8 0 3 -4.8 0 2
  [4,80,-2.8,0,2,-2.8,0,3,-4.8,0,3,-4.8,0,2],
// 4 80 -2.02 0 7.16 -3.48 0 6.18 -2.07 0 4.77 -1.26 0 5.31
  [4,80,-2.02,0,7.16,-3.48,0,6.18,-2.07,0,4.77,-1.26,0,5.31],
// 4 80 0 0 7.5 -2.02 0 7.16 -1.26 0 5.31 0 0 5.5
  [4,80,0,0,7.5,-2.02,0,7.16,-1.26,0,5.31,0,0,5.5],
// 4 80 2.12 0 7.16 0 0 7.5 0 0 5.5 1.16 0 5.31
  [4,80,2.12,0,7.16,0,0,7.5,0,0,5.5,1.16,0,5.31],
// 4 80 3.68 0 6.18 2.12 0 7.16 1.16 0 5.31 2.27 0 4.77
  [4,80,3.68,0,6.18,2.12,0,7.16,1.16,0,5.31,2.27,0,4.77],
// 4 80 4.66 0 4.72 3.68 0 6.18 2.27 0 4.77 2.81 0 3.96
  [4,80,4.66,0,4.72,3.68,0,6.18,2.27,0,4.77,2.81,0,3.96],
// 4 80 5 0 3 4.66 0 4.72 2.81 0 3.96 3 0 3
  [4,80,5,0,3,4.66,0,4.72,2.81,0,3.96,3,0,3],
// 4 80 4.66 0 1.28 5 0 3 3 0 3 2.81 0 2.04
  [4,80,4.66,0,1.28,5,0,3,3,0,3,2.81,0,2.04],
// 4 80 3.68 0 -0.18 4.66 0 1.28 2.81 0 2.04 2.27 0 1.23
  [4,80,3.68,0,-0.18,4.66,0,1.28,2.81,0,2.04,2.27,0,1.23],
// 4 80 2.1 0 -1.1 3.68 0 -0.18 2.27 0 1.23 1.1 0 0.5
  [4,80,2.1,0,-1.1,3.68,0,-0.18,2.27,0,1.23,1.1,0,0.5],
// 4 80 2.1 0 -1.1 1.1 0 0.5 -0.91 0 -0.54 0.89 0 -1.77
  [4,80,2.1,0,-1.1,1.1,0,0.5,-0.91,0,-0.54,0.89,0,-1.77],
// 4 80 -0.28 0 -2.48 0.89 0 -1.77 -0.91 0 -0.54 -2.4 0 -1.53
  [4,80,-0.28,0,-2.48,0.89,0,-1.77,-0.91,0,-0.54,-2.4,0,-1.53],
// 4 80 -1.41 0 -3.29 -0.28 0 -2.48 -2.4 0 -1.53 -3.7 0 -2.74
  [4,80,-1.41,0,-3.29,-0.28,0,-2.48,-2.4,0,-1.53,-3.7,0,-2.74],
// 4 80 -2.39 0 -4.25 -1.41 0 -3.29 -3.7 0 -2.74 -4.66 0 -4.23
  [4,80,-2.39,0,-4.25,-1.41,0,-3.29,-3.7,0,-2.74,-4.66,0,-4.23],
// 4 80 -3 0 -5.5 -2.39 0 -4.25 -4.66 0 -4.23 -5 0 -5.5
  [4,80,-3,0,-5.5,-2.39,0,-4.25,-4.66,0,-4.23,-5,0,-5.5],
// 4 80 -3 0 -5.5 -5 0 -5.5 -5 0 -7.5 5 0 -7.5
  [4,80,-3,0,-5.5,-5,0,-5.5,-5,0,-7.5,5,0,-7.5],
// 3 80 5 0 -5.5 -3 0 -5.5 5 0 -7.5
  [3,80,5,0,-5.5,-3,0,-5.5,5,0,-7.5],
// 
// 3 16 -5 0 -5.5 -10 0 -10 -5 0 -7.5
  [3,16,-5,0,-5.5,-10,0,-10,-5,0,-7.5],
// 4 16 -10 0 -10 -5 0 -5.5 -4.66 0 -4.23 -4.8 0 2
  [4,16,-10,0,-10,-5,0,-5.5,-4.66,0,-4.23,-4.8,0,2],
// 4 16 -4.8 0 2 -4.66 0 -4.23 -3.7 0 -2.74 -2.8 0 2
  [4,16,-4.8,0,2,-4.66,0,-4.23,-3.7,0,-2.74,-2.8,0,2],
// 3 16 -2.8 0 2 -3.7 0 -2.74 -2.4 0 -1.53
  [3,16,-2.8,0,2,-3.7,0,-2.74,-2.4,0,-1.53],
// 3 16 -2.8 0 2 -2.4 0 -1.53 -0.91 0 -0.54
  [3,16,-2.8,0,2,-2.4,0,-1.53,-0.91,0,-0.54],
// 4 16 -2.8 0 2 -0.91 0 -0.54 1.1 0 0.5 -2.8 0 3
  [4,16,-2.8,0,2,-0.91,0,-0.54,1.1,0,0.5,-2.8,0,3],
// 4 16 -2.61 0 3.96 -2.8 0 3 1.1 0 0.5 -2.07 0 4.77
  [4,16,-2.61,0,3.96,-2.8,0,3,1.1,0,0.5,-2.07,0,4.77],
// 4 16 -1.26 0 5.31 -2.07 0 4.77 1.1 0 0.5 0 0 5.5
  [4,16,-1.26,0,5.31,-2.07,0,4.77,1.1,0,0.5,0,0,5.5],
// 4 16 1.16 0 5.31 0 0 5.5 1.1 0 0.5 2.27 0 4.77
  [4,16,1.16,0,5.31,0,0,5.5,1.1,0,0.5,2.27,0,4.77],
// 4 16 2.81 0 3.96 2.27 0 4.77 1.1 0 0.5 2.81 0 2.04
  [4,16,2.81,0,3.96,2.27,0,4.77,1.1,0,0.5,2.81,0,2.04],
// 3 16 2.81 0 3.96 2.81 0 2.04 3 0 3
  [3,16,2.81,0,3.96,2.81,0,2.04,3,0,3],
// 3 16 2.81 0 2.04 1.1 0 0.5 2.27 0 1.23
  [3,16,2.81,0,2.04,1.1,0,0.5,2.27,0,1.23],
// 4 16 -2.39 0 -4.25 -3 0 -5.5 5 0 -5.5 -1.41 0 -3.29
  [4,16,-2.39,0,-4.25,-3,0,-5.5,5,0,-5.5,-1.41,0,-3.29],
// 4 16 -0.28 0 -2.48 -1.41 0 -3.29 5 0 -5.5 0.89 0 -1.77
  [4,16,-0.28,0,-2.48,-1.41,0,-3.29,5,0,-5.5,0.89,0,-1.77],
// 3 16 2.1 0 -1.1 0.89 0 -1.77 5 0 -5.5
  [3,16,2.1,0,-1.1,0.89,0,-1.77,5,0,-5.5],
// 3 16 3.68 0 -0.18 2.1 0 -1.1 5 0 -5.5
  [3,16,3.68,0,-0.18,2.1,0,-1.1,5,0,-5.5],
// 3 16 4.66 0 1.28 3.68 0 -0.18 5 0 -5.5
  [3,16,4.66,0,1.28,3.68,0,-0.18,5,0,-5.5],
// 4 16 5 0 3 4.66 0 1.28 5 0 -5.5 10 0 -10
  [4,16,5,0,3,4.66,0,1.28,5,0,-5.5,10,0,-10],
// 4 16 5 0 3 10 0 -10 10 0 10 4.66 0 4.72
  [4,16,5,0,3,10,0,-10,10,0,10,4.66,0,4.72],
// 3 16 5 0 -5.5 5 0 -7.5 10 0 -10
  [3,16,5,0,-5.5,5,0,-7.5,10,0,-10],
// 4 16 -5 0 -7.5 -10 0 -10 10 0 -10 5 0 -7.5
  [4,16,-5,0,-7.5,-10,0,-10,10,0,-10,5,0,-7.5],
// 3 16 10 0 10 3.68 0 6.18 4.66 0 4.72
  [3,16,10,0,10,3.68,0,6.18,4.66,0,4.72],
// 3 16 10 0 10 2.12 0 7.16 3.68 0 6.18
  [3,16,10,0,10,2.12,0,7.16,3.68,0,6.18],
// 4 16 0 0 7.5 2.12 0 7.16 10 0 10 -10 0 10
  [4,16,0,0,7.5,2.12,0,7.16,10,0,10,-10,0,10],
// 3 16 -10 0 10 -2.02 0 7.16 0 0 7.5
  [3,16,-10,0,10,-2.02,0,7.16,0,0,7.5],
// 3 16 -10 0 10 -3.48 0 6.18 -2.02 0 7.16
  [3,16,-10,0,10,-3.48,0,6.18,-2.02,0,7.16],
// 3 16 -10 0 10 -4.46 0 4.72 -3.48 0 6.18
  [3,16,-10,0,10,-4.46,0,4.72,-3.48,0,6.18],
// 3 16 -10 0 10 -4.8 0 3 -4.46 0 4.72
  [3,16,-10,0,10,-4.8,0,3,-4.46,0,4.72],
// 4 16 -4.8 0 2 -4.8 0 3 -10 0 10 -10 0 -10
  [4,16,-4.8,0,2,-4.8,0,3,-10,0,10,-10,0,-10],
];
module ldraw_lib__3070bpv2(step=0, col=false, unit=2/5, alt=false, line=0.2, solid=!$preview)
    makepoly(ldraw_lib__3070bpv2(solid), step=step, col=col, unit=unit, alt=alt, line=line, solid=solid);
ldraw_lib__3070bpv2(line=0.2);
